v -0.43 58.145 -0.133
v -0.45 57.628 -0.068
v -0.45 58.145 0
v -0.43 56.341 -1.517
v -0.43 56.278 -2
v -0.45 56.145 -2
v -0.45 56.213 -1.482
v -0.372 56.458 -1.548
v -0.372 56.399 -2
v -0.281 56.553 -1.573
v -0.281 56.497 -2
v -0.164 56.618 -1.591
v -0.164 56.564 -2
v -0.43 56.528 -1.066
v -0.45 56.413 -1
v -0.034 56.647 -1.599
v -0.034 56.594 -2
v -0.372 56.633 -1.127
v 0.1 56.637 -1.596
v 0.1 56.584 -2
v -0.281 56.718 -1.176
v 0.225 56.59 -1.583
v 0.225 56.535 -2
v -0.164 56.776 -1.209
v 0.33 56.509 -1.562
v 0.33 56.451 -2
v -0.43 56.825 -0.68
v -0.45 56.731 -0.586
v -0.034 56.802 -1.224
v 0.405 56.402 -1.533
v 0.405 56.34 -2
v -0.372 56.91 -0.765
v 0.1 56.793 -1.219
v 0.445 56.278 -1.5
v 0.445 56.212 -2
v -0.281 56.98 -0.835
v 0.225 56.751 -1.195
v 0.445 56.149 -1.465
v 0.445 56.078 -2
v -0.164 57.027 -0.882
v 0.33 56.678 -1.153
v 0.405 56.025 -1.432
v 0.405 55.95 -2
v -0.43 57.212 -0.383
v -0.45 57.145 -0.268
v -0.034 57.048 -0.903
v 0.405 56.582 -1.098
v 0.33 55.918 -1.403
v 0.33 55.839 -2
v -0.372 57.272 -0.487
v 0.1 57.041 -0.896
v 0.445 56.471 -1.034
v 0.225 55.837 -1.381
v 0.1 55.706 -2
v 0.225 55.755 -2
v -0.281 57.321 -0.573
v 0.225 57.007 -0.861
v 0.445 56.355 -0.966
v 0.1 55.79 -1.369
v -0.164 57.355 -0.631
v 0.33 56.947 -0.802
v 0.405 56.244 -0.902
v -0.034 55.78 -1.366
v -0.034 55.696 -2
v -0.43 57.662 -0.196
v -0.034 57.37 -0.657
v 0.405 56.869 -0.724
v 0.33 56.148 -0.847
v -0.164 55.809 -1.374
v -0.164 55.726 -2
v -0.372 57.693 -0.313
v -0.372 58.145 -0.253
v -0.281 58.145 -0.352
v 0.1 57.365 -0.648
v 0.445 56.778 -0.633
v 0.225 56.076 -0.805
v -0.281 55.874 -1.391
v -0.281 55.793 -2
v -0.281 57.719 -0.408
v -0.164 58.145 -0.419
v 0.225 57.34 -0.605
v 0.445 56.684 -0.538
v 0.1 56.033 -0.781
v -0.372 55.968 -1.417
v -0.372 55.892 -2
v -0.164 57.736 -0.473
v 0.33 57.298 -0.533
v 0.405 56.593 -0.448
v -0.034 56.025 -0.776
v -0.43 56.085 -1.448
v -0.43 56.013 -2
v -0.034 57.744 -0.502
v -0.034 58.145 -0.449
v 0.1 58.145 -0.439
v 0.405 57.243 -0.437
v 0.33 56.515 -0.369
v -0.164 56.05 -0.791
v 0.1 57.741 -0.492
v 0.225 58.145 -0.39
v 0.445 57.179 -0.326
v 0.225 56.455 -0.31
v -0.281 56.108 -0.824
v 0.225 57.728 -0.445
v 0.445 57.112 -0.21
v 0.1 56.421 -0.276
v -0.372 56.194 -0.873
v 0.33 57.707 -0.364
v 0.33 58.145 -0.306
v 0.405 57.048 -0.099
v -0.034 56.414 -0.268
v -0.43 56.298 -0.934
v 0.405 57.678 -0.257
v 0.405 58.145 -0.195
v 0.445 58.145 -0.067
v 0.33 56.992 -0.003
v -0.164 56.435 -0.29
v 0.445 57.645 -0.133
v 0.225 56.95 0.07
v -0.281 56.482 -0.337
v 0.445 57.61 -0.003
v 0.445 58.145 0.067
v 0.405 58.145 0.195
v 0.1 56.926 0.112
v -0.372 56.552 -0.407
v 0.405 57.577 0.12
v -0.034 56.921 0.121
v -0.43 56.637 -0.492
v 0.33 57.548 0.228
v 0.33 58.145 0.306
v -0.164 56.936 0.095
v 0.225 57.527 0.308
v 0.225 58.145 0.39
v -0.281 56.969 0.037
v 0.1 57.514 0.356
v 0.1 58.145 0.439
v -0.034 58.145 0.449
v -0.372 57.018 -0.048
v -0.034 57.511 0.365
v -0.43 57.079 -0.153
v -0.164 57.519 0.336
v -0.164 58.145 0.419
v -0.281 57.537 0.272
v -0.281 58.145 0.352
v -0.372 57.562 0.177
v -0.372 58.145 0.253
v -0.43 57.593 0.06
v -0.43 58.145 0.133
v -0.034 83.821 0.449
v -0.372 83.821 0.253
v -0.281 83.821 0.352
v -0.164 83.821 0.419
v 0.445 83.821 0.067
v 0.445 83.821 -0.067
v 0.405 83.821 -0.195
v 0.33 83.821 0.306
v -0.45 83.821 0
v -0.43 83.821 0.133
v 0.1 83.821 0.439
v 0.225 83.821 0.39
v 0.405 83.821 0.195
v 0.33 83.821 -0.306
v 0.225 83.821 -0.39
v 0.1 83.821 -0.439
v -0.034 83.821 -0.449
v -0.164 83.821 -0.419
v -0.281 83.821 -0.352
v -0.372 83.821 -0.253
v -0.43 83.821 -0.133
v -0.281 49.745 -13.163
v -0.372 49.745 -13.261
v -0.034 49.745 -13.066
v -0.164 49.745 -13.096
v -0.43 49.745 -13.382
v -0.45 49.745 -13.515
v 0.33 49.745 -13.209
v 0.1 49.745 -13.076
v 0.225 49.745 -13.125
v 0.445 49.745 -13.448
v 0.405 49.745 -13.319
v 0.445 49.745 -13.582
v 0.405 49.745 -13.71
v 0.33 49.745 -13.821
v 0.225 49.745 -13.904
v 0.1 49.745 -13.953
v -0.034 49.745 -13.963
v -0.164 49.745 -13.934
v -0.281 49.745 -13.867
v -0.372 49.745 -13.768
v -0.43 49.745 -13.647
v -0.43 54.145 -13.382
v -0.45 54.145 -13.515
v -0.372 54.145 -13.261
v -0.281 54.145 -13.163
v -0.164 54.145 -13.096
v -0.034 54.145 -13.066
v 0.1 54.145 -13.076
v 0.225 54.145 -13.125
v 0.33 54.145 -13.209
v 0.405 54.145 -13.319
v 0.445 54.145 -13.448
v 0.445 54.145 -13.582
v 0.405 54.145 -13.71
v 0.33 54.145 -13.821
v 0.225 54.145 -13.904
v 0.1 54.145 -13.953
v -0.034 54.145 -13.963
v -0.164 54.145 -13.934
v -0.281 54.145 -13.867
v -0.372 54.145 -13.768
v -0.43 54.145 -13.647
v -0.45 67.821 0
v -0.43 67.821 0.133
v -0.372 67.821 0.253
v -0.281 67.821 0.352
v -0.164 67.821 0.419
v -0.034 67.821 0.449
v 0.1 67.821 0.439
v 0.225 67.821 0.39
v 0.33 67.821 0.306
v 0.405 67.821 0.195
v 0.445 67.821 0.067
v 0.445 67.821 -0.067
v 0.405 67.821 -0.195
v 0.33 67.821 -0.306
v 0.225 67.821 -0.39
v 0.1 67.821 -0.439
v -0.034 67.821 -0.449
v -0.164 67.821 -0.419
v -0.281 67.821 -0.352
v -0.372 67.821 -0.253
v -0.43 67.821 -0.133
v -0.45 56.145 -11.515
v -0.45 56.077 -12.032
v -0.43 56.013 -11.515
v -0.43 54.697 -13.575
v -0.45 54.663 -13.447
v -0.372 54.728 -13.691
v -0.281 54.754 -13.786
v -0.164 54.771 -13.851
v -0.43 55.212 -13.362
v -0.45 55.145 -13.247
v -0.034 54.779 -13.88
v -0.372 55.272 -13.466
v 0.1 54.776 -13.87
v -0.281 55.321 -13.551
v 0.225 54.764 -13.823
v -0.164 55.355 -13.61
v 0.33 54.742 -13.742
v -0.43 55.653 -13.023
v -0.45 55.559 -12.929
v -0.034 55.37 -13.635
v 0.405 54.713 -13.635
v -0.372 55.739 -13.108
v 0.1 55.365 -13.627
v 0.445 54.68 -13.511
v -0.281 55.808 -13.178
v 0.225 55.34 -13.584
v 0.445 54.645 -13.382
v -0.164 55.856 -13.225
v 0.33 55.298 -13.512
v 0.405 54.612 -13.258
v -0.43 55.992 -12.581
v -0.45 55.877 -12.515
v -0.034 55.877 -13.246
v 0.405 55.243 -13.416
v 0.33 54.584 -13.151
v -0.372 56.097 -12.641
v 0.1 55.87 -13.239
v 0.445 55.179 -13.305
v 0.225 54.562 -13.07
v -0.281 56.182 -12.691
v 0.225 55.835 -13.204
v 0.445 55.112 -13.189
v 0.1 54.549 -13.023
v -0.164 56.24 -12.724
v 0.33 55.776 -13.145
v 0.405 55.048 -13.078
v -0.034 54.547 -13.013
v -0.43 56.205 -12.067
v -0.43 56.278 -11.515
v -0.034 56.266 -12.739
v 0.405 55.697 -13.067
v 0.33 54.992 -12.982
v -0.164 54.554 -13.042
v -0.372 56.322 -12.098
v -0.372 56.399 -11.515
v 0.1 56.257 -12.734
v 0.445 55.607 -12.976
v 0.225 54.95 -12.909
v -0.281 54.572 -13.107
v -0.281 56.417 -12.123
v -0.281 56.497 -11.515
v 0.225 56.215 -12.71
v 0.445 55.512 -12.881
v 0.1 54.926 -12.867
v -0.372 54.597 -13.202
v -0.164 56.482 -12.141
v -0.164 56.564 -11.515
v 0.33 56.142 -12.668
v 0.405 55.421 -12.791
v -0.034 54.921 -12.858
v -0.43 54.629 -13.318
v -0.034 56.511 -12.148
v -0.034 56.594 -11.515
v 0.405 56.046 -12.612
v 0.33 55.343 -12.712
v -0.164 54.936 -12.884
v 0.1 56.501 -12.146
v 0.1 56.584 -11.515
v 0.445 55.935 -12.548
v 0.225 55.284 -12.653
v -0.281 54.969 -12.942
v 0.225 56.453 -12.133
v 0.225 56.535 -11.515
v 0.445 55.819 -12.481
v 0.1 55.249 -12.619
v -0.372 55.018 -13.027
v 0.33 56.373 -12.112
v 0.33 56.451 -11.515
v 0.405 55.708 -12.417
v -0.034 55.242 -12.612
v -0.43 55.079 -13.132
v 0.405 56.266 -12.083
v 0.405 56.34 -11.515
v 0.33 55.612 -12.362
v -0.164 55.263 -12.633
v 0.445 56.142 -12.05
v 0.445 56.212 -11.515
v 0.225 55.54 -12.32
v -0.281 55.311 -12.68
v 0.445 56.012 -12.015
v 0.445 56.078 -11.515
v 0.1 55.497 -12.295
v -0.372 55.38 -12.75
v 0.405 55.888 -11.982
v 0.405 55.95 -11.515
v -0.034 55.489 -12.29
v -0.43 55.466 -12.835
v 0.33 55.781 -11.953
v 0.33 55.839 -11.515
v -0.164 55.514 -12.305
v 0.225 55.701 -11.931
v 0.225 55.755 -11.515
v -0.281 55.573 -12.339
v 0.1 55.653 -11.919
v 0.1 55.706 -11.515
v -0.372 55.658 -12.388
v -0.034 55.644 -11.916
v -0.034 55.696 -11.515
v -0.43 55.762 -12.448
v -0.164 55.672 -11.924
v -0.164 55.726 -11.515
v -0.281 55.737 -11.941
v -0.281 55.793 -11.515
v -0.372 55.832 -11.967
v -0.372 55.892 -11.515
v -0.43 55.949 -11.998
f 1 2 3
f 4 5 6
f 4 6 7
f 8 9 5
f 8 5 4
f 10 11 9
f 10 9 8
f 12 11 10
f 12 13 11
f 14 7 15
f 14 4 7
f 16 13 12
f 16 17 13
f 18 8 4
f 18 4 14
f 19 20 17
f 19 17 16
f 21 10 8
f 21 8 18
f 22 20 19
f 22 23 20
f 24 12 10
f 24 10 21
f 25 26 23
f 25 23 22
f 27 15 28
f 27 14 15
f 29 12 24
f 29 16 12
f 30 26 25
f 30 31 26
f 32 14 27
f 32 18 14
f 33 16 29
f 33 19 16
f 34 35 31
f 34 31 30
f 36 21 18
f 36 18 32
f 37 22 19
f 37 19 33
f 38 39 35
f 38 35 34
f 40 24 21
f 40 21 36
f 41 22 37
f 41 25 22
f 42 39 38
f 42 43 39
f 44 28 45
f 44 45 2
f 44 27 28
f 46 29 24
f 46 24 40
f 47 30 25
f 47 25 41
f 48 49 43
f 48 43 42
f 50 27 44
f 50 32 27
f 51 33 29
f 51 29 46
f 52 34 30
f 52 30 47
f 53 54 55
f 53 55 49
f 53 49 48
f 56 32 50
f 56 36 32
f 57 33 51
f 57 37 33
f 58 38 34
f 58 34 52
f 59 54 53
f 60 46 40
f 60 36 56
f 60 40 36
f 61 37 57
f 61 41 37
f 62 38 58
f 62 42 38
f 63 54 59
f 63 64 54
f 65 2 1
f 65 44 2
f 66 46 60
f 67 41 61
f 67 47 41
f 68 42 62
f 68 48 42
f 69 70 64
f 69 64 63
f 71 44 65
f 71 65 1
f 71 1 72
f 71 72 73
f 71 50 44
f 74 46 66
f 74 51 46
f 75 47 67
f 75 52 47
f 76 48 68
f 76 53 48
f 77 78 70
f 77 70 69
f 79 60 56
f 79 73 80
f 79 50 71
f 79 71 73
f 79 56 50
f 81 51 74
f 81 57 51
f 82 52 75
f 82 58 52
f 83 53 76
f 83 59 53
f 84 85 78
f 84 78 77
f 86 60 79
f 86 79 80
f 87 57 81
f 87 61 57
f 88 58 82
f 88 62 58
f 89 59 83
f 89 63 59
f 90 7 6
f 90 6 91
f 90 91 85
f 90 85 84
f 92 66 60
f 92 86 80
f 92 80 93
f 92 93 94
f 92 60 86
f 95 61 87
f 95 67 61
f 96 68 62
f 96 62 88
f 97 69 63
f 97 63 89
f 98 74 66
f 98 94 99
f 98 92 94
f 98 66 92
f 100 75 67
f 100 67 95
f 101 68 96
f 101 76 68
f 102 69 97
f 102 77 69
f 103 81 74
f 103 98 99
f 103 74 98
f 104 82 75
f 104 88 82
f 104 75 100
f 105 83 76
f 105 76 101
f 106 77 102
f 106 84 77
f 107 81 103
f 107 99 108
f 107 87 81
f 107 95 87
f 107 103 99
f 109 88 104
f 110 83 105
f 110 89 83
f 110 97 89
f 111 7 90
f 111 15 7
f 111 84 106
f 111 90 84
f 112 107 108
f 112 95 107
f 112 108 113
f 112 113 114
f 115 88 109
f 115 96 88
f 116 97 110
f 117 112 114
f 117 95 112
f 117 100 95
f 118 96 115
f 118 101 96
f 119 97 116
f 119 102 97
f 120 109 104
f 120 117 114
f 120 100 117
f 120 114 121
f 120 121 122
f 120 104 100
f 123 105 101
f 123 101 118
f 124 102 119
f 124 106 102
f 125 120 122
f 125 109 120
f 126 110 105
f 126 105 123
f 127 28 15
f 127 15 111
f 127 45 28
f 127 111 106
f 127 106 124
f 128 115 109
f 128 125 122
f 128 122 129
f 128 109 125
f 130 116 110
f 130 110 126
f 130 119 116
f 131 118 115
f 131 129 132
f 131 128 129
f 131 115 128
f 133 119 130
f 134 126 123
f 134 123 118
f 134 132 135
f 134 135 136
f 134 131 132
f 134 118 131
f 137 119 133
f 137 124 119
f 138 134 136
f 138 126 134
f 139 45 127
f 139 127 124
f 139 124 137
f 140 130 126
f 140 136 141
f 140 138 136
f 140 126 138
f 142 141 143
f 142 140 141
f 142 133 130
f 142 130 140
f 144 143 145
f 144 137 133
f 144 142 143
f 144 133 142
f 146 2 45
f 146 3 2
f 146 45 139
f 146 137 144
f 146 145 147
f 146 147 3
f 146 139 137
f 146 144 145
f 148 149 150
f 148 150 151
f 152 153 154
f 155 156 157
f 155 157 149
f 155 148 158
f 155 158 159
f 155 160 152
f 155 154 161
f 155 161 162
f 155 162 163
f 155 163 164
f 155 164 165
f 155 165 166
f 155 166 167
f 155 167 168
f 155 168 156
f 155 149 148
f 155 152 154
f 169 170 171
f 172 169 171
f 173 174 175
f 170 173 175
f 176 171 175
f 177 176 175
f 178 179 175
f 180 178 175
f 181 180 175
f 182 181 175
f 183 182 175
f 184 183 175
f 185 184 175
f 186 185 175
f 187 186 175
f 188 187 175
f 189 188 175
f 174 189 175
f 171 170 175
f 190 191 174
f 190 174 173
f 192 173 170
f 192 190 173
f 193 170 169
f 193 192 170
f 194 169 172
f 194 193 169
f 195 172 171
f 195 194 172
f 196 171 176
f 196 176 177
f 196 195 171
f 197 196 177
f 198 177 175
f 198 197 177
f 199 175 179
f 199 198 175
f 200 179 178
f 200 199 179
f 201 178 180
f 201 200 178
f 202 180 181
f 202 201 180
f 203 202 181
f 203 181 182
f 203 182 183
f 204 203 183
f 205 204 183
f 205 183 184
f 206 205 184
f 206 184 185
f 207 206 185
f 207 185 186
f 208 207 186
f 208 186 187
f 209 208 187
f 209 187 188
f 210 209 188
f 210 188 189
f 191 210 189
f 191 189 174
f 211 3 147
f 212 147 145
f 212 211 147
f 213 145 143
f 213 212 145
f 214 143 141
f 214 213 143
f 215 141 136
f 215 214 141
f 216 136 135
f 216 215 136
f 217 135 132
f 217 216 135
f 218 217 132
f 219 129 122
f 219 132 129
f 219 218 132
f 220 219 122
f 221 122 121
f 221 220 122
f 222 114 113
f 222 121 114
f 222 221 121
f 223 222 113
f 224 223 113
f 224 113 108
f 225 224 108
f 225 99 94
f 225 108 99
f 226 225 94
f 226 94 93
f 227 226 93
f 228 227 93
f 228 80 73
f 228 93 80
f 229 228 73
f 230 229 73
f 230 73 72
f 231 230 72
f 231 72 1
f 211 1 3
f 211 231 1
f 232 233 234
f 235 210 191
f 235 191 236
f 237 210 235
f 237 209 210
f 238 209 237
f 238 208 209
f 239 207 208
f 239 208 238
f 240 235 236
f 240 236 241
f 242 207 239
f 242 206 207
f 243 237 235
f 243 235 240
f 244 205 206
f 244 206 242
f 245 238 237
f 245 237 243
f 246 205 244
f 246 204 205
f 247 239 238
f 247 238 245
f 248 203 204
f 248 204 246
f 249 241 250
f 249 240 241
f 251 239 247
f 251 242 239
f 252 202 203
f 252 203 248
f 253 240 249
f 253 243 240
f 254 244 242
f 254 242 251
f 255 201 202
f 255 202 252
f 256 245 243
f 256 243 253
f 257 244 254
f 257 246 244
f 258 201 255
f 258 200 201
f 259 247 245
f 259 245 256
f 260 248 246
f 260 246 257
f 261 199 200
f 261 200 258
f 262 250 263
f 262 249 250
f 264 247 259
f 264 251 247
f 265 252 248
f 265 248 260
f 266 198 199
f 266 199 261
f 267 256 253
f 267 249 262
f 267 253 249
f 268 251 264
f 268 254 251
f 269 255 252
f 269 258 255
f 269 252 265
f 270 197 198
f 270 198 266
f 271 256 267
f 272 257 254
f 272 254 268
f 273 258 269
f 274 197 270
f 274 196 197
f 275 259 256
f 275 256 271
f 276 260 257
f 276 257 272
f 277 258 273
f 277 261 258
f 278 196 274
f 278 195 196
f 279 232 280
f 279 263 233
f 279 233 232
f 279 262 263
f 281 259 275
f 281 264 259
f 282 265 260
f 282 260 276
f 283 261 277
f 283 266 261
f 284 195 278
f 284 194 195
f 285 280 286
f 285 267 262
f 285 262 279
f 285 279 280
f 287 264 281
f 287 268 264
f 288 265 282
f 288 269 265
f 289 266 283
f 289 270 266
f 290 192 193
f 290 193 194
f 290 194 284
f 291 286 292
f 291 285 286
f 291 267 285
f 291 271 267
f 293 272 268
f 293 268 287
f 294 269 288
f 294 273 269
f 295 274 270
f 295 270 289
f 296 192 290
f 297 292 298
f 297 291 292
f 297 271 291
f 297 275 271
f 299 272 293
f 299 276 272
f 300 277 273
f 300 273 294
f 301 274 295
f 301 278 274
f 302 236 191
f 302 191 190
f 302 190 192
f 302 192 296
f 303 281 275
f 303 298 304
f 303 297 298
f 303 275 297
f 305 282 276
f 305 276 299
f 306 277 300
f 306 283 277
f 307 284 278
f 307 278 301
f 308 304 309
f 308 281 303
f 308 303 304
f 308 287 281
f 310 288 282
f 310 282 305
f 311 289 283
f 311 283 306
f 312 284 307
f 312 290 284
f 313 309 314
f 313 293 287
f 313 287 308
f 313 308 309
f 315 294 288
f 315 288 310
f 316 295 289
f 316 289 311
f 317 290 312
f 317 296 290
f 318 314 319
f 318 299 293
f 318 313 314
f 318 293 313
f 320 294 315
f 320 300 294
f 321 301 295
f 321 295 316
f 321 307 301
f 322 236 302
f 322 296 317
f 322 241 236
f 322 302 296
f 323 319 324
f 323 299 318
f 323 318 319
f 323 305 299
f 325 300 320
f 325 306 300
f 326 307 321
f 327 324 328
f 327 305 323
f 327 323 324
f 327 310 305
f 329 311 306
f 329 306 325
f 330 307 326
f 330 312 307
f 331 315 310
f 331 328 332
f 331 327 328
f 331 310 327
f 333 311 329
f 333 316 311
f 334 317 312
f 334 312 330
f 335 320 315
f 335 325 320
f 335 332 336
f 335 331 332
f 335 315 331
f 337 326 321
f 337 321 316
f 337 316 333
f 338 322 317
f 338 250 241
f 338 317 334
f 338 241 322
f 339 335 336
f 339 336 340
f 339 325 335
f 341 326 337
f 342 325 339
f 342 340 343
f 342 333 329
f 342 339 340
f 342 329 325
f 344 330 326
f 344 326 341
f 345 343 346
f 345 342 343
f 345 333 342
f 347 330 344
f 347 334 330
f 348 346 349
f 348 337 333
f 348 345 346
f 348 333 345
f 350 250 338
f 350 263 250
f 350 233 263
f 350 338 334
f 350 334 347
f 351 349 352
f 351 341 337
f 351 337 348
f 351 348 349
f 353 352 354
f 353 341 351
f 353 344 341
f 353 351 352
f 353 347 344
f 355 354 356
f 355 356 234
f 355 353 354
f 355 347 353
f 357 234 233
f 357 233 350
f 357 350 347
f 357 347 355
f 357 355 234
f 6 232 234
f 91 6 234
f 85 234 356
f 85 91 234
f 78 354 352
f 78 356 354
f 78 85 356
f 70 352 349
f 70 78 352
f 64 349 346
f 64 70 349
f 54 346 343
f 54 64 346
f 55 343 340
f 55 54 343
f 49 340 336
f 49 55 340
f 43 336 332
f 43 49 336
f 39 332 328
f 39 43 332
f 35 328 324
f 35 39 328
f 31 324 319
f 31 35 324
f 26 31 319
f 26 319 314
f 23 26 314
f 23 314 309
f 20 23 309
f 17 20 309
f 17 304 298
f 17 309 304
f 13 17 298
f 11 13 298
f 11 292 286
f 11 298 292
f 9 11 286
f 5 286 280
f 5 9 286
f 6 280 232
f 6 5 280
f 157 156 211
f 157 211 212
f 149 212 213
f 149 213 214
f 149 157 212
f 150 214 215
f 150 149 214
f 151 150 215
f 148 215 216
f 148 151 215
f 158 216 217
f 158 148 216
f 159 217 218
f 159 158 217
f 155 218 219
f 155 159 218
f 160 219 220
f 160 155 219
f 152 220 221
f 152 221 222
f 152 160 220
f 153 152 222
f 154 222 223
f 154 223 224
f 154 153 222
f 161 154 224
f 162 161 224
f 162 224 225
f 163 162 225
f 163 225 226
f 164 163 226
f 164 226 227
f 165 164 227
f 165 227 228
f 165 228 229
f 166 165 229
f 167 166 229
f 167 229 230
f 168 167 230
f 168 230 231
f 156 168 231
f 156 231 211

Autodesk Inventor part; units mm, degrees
ref_plane "YZ Plane" through (0, 0, 0) normal (1, 0, 0) x (0, 1, 0)
ref_plane "XZ Plane" through (0, 0, 0) normal (0, 1, 0) x (-1, 0, 0)
sketch "Sketch1" plane through (0, 0, 0) normal (1, 0, 0) x (0, 1, 0)
  line L0 (67.821, 0) -> (56.1452, -2.7707)
  line L1 (67.821, 0) -> (0, 0)
  dimension "d2" = 12
  dimension "d10" = 67.821
ref_plane "Work Plane1" through (0, 0, 0) normal (-1, 0, 0) x (0, 0, 1)
sketch "Sketch2" plane through (0, 0, 0) normal (-1, 0, 0) x (0, 0, 1)
  line L0 (0, 67.821) -> (0, 83.821)
  line L1 (-13.5147, 54.1452) -> (-13.5147, 49.7452)
  arc A0 (-11.5147, 56.1452) -> (-13.5147, 54.1452) centre (-11.5147, 54.1452) ccw
  line L2 (0, 67.821) -> (0, 58.1452)
  arc A1 (-2, 56.1452) -> (0, 58.1452) centre (-2, 58.1452) ccw
  line L3 (-2, 56.1452) -> (-11.5147, 56.1452)
  point P0 (-13.5147, 56.1452)
  dimension "d5" = 16
  dimension "d12" = 6.4
  dimension "d13" = 2
  dimension "d16" = 2
ref_plane "Work Plane2" through (0, 83.821, 0) normal (0, 1, 0) x (-1, 0, 0)
sketch "Sketch3" plane through (0, 83.821, 0) normal (0, 1, 0) x (-1, 0, 0)
  circle A0 centre (0, 0) radius 0.45
  dimension "d6" = 0.9
sweep "Sweep3" add profiles "Sketch3" path "Sketch2"
properties part number "cable 2"
